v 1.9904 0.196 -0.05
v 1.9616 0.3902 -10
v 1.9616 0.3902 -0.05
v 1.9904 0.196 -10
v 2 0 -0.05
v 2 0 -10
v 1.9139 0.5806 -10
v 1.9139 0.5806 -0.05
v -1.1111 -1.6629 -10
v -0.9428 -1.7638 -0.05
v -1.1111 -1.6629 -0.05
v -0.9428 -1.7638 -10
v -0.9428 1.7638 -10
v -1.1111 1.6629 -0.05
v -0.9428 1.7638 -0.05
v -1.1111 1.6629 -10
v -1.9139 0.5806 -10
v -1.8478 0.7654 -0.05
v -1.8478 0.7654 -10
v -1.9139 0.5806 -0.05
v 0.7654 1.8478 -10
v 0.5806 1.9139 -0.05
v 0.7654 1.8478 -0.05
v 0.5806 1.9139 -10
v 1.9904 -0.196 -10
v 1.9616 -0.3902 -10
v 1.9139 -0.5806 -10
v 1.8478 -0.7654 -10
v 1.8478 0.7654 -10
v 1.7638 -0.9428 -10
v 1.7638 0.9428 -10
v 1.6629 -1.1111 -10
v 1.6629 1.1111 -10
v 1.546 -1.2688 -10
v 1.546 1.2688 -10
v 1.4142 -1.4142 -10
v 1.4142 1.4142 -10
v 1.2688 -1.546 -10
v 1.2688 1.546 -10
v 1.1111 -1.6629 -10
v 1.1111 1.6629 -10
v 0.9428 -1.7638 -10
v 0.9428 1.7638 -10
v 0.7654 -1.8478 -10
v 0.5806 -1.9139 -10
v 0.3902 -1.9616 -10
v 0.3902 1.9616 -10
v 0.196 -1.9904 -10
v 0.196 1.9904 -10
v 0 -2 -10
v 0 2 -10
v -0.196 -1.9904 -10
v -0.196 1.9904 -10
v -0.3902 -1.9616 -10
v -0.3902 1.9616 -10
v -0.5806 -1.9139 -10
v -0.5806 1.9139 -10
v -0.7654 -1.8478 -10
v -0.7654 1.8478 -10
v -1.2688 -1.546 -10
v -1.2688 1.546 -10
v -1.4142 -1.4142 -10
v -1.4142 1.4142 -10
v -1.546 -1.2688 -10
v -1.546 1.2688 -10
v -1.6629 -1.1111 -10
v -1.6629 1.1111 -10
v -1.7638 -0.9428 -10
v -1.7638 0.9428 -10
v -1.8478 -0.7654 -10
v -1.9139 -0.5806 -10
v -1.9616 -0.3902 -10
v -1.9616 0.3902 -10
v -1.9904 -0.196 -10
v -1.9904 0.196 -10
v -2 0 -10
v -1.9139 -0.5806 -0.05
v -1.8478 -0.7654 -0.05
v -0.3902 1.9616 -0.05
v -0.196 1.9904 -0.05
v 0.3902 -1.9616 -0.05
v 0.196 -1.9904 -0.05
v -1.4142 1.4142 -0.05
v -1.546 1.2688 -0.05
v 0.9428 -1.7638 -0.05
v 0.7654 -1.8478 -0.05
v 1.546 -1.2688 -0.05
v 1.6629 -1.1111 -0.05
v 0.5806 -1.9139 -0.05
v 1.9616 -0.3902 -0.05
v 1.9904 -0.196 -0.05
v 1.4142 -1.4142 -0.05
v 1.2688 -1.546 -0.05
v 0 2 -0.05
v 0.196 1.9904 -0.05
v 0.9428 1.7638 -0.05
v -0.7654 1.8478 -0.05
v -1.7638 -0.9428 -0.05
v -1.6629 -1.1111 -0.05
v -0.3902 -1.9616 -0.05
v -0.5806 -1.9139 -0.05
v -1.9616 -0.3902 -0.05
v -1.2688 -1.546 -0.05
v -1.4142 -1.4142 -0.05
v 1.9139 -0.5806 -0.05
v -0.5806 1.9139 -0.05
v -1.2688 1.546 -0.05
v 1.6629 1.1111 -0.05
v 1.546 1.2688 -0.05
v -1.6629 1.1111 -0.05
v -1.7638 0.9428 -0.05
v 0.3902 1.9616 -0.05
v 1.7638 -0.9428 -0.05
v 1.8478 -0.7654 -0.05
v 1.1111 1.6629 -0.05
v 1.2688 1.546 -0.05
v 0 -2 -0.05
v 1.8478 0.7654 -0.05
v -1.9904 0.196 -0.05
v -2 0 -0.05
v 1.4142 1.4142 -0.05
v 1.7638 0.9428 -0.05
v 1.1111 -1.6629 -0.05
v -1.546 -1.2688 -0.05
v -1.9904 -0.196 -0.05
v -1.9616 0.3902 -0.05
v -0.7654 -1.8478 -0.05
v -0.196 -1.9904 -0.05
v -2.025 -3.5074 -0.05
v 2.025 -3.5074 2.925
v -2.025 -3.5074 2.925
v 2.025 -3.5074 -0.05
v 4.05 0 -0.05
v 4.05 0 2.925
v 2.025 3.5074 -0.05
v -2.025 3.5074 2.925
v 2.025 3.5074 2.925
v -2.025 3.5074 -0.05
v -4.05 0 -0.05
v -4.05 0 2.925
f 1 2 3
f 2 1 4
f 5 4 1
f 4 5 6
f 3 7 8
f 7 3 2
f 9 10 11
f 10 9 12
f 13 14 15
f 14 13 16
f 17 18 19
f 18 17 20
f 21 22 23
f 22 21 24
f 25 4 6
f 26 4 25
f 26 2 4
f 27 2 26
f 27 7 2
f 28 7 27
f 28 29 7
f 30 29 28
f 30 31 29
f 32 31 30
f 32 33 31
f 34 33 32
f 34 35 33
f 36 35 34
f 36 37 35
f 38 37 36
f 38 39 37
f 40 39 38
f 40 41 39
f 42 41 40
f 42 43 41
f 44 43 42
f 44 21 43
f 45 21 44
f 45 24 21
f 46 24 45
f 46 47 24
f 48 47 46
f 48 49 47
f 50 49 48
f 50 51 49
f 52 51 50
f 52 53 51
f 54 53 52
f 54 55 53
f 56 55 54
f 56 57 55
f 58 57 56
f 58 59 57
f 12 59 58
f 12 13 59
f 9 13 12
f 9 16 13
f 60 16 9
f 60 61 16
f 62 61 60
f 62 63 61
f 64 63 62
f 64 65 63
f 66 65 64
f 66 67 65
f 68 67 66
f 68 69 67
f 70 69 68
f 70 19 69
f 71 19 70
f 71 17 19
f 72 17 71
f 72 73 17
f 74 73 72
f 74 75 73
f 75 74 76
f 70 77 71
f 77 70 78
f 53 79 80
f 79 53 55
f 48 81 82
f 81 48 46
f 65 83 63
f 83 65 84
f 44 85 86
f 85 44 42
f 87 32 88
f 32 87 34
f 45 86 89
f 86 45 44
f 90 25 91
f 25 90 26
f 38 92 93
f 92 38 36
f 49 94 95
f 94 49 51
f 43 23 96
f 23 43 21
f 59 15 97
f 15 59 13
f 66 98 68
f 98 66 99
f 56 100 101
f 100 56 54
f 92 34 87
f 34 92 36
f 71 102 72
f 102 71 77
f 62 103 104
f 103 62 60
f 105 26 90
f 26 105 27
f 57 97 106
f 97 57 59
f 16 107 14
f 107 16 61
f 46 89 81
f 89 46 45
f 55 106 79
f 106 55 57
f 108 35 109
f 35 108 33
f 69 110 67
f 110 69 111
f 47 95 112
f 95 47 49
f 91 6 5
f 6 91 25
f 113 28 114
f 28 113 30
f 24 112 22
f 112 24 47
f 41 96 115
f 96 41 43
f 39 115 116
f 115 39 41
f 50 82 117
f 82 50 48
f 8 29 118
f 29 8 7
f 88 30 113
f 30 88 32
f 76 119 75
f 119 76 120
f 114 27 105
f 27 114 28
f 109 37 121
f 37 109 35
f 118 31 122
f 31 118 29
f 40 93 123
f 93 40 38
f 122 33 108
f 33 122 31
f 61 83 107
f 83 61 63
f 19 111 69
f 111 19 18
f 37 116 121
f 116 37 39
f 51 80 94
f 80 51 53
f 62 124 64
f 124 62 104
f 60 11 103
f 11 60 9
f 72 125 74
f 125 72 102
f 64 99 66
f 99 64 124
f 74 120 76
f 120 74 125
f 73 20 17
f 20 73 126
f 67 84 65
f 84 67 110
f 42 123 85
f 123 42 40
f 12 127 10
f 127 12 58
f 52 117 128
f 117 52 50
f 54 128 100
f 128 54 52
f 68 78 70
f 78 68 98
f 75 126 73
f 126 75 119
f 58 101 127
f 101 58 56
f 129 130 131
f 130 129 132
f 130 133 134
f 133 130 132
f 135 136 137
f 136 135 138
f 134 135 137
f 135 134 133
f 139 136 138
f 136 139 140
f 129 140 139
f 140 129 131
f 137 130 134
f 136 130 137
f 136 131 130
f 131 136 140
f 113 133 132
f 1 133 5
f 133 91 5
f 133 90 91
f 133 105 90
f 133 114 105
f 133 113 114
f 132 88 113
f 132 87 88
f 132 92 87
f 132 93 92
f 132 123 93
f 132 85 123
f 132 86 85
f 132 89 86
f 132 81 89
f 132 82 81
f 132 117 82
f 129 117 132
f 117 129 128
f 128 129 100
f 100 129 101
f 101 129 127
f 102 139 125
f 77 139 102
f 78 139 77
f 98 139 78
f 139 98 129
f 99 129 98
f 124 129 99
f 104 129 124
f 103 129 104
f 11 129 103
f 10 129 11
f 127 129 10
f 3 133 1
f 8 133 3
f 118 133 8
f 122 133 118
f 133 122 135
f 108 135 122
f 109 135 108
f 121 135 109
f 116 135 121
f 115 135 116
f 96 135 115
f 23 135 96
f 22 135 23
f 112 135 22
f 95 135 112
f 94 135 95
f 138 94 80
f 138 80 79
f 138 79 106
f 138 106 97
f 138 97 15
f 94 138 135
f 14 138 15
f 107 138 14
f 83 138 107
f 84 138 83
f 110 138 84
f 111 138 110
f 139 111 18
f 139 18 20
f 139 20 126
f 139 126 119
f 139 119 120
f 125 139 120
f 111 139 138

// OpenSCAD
// Hex head screw: 4.0mm shank diameter, 8.1mm head diameter (across corners),
// head height 2.925mm, 10mm length under head. One connected solid.

shaft_diameter_mm = 4.0;
length_under_head_mm = 10.0;
head_diameter_across_corners_mm = 8.1;
head_height_mm = 2.925;

overlap_mm = 0.05; // small overlap to ensure watertight union

module hex_head_screw() {
    union() {
        // Shaft (Z from -L to 0)
        translate([0, 0, -length_under_head_mm/2])
            cylinder(h=length_under_head_mm, r=shaft_diameter_mm/2, center=true, $fn=64);

        // Hex head (Z from 0 to head_height)
        // Use $fn=6 for true hex silhouette in orthographic views.
        translate([0, 0, head_height_mm/2 - overlap_mm/2])
            cylinder(h=head_height_mm + overlap_mm, r=head_diameter_across_corners_mm/2, center=true, $fn=6);
    }
}

hex_head_screw();
